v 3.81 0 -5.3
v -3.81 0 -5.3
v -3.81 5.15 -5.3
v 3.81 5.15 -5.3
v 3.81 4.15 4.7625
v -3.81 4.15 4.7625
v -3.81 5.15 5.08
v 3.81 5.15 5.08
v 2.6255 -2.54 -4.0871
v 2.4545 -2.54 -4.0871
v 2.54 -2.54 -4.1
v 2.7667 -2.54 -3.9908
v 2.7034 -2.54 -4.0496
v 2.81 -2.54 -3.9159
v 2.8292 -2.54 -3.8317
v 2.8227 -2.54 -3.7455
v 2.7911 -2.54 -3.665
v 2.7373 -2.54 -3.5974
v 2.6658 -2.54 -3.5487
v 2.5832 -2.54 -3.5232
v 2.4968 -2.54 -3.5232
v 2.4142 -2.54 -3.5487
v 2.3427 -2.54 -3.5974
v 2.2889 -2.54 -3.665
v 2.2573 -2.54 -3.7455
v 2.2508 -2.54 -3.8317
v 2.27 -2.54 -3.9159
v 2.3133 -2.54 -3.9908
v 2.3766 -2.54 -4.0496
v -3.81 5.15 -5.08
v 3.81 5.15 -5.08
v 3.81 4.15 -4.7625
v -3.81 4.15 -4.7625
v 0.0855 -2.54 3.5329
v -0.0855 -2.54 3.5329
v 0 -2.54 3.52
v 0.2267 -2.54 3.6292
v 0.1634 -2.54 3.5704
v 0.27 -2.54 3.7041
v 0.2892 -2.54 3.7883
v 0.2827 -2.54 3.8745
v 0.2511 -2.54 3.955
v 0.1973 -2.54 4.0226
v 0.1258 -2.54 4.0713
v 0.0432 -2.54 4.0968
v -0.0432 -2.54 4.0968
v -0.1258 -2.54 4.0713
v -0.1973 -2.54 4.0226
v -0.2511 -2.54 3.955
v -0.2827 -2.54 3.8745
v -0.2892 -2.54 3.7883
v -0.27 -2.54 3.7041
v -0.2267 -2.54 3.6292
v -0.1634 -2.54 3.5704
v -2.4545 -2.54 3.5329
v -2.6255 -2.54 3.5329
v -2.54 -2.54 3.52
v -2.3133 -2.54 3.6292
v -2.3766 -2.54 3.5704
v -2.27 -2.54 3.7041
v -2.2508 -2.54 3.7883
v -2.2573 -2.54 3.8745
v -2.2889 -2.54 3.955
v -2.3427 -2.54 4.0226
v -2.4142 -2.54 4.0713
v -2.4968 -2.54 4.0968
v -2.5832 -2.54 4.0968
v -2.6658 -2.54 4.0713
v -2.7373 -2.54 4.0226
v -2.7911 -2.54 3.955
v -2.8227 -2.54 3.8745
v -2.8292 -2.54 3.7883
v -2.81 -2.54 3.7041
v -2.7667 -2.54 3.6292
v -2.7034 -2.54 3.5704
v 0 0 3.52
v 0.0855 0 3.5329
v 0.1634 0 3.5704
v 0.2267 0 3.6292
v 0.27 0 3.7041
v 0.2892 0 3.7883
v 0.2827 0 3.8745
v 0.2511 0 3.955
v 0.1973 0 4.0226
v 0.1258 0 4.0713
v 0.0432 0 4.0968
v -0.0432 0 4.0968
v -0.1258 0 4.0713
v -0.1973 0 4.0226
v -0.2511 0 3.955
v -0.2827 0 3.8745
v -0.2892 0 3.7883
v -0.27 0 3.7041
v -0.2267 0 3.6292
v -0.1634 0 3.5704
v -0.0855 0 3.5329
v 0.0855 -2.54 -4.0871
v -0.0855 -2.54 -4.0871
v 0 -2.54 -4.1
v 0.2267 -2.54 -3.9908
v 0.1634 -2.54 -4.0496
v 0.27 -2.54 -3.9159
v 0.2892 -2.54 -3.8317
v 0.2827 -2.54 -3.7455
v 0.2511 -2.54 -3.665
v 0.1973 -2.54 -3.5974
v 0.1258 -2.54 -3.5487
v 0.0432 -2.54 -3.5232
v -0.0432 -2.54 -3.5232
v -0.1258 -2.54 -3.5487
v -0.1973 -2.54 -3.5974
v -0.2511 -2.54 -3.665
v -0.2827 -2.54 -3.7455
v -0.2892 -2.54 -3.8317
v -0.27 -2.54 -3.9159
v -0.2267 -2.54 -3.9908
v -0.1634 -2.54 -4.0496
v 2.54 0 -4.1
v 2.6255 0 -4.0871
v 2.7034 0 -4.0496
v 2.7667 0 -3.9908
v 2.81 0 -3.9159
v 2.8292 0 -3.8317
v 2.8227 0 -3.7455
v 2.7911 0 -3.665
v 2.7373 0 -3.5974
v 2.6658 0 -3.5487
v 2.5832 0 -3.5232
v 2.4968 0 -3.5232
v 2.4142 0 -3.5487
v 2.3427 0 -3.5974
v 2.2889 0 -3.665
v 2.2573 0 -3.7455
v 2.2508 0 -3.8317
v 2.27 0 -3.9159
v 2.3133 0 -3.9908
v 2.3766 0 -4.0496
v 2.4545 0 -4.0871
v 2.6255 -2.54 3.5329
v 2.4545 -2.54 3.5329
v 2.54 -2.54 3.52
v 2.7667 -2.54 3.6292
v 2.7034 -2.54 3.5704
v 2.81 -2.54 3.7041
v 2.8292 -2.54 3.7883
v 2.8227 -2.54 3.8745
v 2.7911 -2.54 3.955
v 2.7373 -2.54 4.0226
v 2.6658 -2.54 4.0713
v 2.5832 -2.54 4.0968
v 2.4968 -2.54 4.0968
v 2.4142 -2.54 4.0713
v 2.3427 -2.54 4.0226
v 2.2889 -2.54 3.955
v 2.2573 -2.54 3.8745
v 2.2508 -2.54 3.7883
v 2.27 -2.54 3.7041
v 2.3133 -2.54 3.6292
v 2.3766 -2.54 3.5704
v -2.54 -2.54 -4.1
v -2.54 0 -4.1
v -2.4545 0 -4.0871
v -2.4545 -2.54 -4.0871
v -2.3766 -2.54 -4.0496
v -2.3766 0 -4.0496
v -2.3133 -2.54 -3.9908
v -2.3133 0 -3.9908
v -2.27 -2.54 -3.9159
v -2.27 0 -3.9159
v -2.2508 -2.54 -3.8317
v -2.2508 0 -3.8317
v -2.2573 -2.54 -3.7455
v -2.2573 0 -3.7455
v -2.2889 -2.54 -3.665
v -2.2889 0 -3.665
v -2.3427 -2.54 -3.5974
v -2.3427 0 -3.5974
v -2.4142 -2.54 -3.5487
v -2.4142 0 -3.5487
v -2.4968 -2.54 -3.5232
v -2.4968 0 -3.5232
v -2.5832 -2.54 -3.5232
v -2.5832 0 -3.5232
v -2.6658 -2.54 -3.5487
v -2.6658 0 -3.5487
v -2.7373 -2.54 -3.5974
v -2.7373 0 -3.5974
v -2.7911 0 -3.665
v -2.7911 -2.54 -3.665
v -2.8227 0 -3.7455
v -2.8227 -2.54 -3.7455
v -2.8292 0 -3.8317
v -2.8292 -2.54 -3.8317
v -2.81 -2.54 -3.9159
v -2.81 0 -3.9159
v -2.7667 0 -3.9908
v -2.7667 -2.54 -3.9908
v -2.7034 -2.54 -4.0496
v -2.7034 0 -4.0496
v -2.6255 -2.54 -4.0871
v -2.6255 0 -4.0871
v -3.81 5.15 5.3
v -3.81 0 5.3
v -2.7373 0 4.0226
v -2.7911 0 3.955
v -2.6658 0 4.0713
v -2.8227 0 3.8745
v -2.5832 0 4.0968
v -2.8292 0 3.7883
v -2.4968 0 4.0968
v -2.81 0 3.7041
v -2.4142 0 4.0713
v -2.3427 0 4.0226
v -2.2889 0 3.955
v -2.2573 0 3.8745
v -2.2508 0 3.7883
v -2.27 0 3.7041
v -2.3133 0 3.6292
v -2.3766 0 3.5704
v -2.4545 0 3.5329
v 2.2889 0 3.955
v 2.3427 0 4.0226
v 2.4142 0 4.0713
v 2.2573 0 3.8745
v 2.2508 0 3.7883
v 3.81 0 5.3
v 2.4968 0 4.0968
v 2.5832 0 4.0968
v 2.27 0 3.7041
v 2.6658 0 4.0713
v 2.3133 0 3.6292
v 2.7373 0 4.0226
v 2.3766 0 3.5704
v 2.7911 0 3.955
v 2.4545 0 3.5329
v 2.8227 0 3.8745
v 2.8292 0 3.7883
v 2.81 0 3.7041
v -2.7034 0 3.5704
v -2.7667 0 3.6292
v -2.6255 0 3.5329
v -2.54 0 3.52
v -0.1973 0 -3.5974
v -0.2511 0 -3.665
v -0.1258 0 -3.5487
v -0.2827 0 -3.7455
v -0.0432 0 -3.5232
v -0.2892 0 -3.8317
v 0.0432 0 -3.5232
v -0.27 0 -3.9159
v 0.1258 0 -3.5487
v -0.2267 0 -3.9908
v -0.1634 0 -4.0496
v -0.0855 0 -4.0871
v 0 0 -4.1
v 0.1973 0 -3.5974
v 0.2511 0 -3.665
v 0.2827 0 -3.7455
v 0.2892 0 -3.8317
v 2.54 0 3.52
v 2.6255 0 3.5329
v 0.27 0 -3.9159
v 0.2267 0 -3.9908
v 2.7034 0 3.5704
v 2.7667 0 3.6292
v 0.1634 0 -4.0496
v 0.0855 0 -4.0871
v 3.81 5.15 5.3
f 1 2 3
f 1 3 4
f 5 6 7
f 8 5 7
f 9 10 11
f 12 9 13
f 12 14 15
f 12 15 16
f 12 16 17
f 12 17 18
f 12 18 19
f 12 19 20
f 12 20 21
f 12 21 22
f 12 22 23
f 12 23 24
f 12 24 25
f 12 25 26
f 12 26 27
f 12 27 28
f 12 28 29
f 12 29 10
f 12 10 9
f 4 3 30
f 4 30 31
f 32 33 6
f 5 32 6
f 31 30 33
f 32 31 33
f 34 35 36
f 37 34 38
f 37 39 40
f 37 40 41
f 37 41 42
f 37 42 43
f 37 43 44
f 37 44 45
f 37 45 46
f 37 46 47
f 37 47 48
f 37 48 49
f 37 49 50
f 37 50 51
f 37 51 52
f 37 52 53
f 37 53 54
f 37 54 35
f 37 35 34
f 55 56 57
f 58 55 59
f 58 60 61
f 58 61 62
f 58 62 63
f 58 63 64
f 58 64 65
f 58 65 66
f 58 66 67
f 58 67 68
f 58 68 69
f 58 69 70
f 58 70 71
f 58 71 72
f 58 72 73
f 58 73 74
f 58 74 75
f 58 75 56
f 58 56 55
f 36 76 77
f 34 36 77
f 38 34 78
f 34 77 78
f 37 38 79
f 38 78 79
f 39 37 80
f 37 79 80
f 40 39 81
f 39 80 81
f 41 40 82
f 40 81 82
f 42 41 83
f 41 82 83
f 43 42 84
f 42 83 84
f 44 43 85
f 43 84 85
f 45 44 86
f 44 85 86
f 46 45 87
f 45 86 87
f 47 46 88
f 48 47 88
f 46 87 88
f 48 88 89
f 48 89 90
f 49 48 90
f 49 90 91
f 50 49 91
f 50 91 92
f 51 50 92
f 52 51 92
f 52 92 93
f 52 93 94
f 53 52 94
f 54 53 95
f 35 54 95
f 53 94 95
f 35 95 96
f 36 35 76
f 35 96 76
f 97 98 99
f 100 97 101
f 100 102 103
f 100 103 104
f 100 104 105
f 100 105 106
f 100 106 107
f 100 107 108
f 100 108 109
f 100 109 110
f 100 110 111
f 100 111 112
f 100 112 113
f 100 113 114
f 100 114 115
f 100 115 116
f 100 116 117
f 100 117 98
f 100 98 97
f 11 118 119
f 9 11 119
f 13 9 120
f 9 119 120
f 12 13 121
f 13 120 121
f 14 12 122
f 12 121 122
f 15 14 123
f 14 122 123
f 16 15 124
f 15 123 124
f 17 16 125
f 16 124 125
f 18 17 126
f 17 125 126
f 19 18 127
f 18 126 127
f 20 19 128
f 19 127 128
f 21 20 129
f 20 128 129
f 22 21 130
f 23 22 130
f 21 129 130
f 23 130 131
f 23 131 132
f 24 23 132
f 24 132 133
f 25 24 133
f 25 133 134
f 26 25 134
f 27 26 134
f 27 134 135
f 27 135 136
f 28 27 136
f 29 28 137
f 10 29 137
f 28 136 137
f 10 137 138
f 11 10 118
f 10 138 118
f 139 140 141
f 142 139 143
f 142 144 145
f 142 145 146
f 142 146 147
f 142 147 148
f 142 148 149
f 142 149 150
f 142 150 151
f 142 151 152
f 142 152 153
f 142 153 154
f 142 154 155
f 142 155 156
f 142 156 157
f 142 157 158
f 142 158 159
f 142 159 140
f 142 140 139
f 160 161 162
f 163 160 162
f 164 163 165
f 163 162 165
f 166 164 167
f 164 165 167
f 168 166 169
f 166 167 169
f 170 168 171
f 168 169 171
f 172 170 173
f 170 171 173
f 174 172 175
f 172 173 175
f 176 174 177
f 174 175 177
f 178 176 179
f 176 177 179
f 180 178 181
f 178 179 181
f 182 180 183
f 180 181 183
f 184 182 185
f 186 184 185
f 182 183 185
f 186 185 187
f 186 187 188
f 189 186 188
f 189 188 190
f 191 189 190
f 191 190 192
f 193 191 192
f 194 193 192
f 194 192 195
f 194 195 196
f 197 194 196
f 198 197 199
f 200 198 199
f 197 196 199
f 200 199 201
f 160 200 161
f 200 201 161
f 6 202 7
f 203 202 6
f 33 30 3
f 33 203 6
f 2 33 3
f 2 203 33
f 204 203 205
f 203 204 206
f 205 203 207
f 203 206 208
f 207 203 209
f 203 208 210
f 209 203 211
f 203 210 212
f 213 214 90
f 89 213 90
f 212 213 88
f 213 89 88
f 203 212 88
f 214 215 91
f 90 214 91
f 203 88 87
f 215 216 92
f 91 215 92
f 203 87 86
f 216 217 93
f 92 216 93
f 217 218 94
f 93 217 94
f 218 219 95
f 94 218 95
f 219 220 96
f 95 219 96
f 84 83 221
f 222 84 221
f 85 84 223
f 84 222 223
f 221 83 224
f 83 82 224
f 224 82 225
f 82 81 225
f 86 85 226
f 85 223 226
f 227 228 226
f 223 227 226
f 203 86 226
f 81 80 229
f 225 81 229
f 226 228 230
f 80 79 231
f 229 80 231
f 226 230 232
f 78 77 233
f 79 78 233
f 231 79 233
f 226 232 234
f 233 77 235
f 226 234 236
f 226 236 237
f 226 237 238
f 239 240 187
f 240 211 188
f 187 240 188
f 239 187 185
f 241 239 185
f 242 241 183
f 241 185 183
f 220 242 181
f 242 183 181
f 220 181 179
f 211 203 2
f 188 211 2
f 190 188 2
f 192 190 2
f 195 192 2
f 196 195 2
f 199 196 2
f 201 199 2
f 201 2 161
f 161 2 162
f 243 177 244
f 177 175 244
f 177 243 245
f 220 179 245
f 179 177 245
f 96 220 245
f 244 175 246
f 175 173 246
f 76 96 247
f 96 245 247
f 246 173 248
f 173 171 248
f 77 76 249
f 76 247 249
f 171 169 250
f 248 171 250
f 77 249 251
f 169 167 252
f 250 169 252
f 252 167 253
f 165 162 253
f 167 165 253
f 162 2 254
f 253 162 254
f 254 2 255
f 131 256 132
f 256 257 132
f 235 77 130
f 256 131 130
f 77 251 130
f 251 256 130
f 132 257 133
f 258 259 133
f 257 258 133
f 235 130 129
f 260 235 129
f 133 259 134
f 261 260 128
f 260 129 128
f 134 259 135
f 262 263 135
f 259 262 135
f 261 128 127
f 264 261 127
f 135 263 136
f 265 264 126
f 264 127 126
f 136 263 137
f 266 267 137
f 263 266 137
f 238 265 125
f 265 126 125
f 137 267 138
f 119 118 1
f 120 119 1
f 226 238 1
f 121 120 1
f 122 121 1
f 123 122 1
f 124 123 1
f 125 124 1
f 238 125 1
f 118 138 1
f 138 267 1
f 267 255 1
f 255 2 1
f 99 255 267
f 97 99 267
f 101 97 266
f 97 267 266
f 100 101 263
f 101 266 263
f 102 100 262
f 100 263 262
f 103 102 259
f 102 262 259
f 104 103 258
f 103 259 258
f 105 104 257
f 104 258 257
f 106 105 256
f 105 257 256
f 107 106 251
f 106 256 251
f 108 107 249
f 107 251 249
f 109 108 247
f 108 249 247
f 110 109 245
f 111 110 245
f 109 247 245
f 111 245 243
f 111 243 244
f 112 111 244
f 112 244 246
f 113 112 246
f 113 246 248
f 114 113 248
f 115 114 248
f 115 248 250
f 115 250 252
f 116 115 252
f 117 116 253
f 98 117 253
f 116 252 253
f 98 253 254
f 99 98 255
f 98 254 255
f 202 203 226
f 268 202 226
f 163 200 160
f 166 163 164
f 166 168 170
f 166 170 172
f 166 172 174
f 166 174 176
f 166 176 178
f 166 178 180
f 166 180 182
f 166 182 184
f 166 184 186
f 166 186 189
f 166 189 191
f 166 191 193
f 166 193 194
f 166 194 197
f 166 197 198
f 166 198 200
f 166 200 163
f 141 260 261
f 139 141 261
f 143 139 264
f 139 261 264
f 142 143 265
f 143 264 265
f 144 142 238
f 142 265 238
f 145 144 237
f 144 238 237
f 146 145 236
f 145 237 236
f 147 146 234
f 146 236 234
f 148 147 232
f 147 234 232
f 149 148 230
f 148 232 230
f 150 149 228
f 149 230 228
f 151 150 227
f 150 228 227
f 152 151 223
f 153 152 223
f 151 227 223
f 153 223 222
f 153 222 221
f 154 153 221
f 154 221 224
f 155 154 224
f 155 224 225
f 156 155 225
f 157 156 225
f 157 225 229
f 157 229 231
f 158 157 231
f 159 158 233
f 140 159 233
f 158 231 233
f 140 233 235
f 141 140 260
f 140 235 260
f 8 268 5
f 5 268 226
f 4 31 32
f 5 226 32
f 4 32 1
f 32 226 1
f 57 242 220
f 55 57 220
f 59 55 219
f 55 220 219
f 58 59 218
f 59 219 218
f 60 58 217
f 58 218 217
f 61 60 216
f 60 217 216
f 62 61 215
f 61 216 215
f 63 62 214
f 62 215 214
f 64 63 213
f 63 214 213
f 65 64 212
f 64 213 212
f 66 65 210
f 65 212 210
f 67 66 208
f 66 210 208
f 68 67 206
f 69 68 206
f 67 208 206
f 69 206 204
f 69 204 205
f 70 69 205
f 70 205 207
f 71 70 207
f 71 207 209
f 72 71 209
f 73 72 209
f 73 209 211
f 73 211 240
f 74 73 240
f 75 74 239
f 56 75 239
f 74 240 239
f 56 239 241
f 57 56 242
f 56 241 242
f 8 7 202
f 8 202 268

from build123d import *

# Parameters (mm, degrees)
SKETCH1_W            = 7.62
SKETCH1_H            = 10.6
BOSS_EXTRUDE1_DEPTH  = 5.15
SKETCH3_R            = 0.29
BOSS_EXTRUDE2_DEPTH  = 2.54
LPATTERN1_COUNT      = 3
LPATTERN1_PITCH      = 2.54
LPATTERN1_COUNT_DIR2 = 2
LPATTERN1_PITCH_DIR2 = 7.62
CUT_EXTRUDE1_DEPTH   = 11.614937588


with BuildPart() as part:
    # Sketch1 → Boss-Extrude1 (new body)
    with BuildSketch(Plane(origin=(0, 0, 0), x_dir=(1, 0, 0), z_dir=(0, 1, 0))):
        Rectangle(SKETCH1_W, SKETCH1_H)
    extrude(amount=BOSS_EXTRUDE1_DEPTH)

    # Sketch3 → Boss-Extrude2 (add)
    with BuildSketch(Plane.XZ):
        with Locations(Location((2.54, -3.81, 0), (0, 0, 270))):
            Circle(SKETCH3_R)
    boss_extrude2 = extrude(amount=BOSS_EXTRUDE2_DEPTH)

    # LPattern1: Boss-Extrude2 3 × 2
    with Locations(*[(-i * LPATTERN1_PITCH, 0, j * LPATTERN1_PITCH_DIR2) for i in range(LPATTERN1_COUNT) for j in range(LPATTERN1_COUNT_DIR2) if (i, j) != (0, 0)]):
        add(boss_extrude2)

    # Sketch4 → Cut-Extrude1 (cut, through all)
    with BuildSketch(Plane.ZY.offset(3.81)):
        Polygon((-5.08, 5.15), (-4.7625, 4.15), (4.7625, 4.15), (5.08, 5.15), align=None)
    extrude(amount=-CUT_EXTRUDE1_DEPTH, mode=Mode.SUBTRACT)


solid = part.part
